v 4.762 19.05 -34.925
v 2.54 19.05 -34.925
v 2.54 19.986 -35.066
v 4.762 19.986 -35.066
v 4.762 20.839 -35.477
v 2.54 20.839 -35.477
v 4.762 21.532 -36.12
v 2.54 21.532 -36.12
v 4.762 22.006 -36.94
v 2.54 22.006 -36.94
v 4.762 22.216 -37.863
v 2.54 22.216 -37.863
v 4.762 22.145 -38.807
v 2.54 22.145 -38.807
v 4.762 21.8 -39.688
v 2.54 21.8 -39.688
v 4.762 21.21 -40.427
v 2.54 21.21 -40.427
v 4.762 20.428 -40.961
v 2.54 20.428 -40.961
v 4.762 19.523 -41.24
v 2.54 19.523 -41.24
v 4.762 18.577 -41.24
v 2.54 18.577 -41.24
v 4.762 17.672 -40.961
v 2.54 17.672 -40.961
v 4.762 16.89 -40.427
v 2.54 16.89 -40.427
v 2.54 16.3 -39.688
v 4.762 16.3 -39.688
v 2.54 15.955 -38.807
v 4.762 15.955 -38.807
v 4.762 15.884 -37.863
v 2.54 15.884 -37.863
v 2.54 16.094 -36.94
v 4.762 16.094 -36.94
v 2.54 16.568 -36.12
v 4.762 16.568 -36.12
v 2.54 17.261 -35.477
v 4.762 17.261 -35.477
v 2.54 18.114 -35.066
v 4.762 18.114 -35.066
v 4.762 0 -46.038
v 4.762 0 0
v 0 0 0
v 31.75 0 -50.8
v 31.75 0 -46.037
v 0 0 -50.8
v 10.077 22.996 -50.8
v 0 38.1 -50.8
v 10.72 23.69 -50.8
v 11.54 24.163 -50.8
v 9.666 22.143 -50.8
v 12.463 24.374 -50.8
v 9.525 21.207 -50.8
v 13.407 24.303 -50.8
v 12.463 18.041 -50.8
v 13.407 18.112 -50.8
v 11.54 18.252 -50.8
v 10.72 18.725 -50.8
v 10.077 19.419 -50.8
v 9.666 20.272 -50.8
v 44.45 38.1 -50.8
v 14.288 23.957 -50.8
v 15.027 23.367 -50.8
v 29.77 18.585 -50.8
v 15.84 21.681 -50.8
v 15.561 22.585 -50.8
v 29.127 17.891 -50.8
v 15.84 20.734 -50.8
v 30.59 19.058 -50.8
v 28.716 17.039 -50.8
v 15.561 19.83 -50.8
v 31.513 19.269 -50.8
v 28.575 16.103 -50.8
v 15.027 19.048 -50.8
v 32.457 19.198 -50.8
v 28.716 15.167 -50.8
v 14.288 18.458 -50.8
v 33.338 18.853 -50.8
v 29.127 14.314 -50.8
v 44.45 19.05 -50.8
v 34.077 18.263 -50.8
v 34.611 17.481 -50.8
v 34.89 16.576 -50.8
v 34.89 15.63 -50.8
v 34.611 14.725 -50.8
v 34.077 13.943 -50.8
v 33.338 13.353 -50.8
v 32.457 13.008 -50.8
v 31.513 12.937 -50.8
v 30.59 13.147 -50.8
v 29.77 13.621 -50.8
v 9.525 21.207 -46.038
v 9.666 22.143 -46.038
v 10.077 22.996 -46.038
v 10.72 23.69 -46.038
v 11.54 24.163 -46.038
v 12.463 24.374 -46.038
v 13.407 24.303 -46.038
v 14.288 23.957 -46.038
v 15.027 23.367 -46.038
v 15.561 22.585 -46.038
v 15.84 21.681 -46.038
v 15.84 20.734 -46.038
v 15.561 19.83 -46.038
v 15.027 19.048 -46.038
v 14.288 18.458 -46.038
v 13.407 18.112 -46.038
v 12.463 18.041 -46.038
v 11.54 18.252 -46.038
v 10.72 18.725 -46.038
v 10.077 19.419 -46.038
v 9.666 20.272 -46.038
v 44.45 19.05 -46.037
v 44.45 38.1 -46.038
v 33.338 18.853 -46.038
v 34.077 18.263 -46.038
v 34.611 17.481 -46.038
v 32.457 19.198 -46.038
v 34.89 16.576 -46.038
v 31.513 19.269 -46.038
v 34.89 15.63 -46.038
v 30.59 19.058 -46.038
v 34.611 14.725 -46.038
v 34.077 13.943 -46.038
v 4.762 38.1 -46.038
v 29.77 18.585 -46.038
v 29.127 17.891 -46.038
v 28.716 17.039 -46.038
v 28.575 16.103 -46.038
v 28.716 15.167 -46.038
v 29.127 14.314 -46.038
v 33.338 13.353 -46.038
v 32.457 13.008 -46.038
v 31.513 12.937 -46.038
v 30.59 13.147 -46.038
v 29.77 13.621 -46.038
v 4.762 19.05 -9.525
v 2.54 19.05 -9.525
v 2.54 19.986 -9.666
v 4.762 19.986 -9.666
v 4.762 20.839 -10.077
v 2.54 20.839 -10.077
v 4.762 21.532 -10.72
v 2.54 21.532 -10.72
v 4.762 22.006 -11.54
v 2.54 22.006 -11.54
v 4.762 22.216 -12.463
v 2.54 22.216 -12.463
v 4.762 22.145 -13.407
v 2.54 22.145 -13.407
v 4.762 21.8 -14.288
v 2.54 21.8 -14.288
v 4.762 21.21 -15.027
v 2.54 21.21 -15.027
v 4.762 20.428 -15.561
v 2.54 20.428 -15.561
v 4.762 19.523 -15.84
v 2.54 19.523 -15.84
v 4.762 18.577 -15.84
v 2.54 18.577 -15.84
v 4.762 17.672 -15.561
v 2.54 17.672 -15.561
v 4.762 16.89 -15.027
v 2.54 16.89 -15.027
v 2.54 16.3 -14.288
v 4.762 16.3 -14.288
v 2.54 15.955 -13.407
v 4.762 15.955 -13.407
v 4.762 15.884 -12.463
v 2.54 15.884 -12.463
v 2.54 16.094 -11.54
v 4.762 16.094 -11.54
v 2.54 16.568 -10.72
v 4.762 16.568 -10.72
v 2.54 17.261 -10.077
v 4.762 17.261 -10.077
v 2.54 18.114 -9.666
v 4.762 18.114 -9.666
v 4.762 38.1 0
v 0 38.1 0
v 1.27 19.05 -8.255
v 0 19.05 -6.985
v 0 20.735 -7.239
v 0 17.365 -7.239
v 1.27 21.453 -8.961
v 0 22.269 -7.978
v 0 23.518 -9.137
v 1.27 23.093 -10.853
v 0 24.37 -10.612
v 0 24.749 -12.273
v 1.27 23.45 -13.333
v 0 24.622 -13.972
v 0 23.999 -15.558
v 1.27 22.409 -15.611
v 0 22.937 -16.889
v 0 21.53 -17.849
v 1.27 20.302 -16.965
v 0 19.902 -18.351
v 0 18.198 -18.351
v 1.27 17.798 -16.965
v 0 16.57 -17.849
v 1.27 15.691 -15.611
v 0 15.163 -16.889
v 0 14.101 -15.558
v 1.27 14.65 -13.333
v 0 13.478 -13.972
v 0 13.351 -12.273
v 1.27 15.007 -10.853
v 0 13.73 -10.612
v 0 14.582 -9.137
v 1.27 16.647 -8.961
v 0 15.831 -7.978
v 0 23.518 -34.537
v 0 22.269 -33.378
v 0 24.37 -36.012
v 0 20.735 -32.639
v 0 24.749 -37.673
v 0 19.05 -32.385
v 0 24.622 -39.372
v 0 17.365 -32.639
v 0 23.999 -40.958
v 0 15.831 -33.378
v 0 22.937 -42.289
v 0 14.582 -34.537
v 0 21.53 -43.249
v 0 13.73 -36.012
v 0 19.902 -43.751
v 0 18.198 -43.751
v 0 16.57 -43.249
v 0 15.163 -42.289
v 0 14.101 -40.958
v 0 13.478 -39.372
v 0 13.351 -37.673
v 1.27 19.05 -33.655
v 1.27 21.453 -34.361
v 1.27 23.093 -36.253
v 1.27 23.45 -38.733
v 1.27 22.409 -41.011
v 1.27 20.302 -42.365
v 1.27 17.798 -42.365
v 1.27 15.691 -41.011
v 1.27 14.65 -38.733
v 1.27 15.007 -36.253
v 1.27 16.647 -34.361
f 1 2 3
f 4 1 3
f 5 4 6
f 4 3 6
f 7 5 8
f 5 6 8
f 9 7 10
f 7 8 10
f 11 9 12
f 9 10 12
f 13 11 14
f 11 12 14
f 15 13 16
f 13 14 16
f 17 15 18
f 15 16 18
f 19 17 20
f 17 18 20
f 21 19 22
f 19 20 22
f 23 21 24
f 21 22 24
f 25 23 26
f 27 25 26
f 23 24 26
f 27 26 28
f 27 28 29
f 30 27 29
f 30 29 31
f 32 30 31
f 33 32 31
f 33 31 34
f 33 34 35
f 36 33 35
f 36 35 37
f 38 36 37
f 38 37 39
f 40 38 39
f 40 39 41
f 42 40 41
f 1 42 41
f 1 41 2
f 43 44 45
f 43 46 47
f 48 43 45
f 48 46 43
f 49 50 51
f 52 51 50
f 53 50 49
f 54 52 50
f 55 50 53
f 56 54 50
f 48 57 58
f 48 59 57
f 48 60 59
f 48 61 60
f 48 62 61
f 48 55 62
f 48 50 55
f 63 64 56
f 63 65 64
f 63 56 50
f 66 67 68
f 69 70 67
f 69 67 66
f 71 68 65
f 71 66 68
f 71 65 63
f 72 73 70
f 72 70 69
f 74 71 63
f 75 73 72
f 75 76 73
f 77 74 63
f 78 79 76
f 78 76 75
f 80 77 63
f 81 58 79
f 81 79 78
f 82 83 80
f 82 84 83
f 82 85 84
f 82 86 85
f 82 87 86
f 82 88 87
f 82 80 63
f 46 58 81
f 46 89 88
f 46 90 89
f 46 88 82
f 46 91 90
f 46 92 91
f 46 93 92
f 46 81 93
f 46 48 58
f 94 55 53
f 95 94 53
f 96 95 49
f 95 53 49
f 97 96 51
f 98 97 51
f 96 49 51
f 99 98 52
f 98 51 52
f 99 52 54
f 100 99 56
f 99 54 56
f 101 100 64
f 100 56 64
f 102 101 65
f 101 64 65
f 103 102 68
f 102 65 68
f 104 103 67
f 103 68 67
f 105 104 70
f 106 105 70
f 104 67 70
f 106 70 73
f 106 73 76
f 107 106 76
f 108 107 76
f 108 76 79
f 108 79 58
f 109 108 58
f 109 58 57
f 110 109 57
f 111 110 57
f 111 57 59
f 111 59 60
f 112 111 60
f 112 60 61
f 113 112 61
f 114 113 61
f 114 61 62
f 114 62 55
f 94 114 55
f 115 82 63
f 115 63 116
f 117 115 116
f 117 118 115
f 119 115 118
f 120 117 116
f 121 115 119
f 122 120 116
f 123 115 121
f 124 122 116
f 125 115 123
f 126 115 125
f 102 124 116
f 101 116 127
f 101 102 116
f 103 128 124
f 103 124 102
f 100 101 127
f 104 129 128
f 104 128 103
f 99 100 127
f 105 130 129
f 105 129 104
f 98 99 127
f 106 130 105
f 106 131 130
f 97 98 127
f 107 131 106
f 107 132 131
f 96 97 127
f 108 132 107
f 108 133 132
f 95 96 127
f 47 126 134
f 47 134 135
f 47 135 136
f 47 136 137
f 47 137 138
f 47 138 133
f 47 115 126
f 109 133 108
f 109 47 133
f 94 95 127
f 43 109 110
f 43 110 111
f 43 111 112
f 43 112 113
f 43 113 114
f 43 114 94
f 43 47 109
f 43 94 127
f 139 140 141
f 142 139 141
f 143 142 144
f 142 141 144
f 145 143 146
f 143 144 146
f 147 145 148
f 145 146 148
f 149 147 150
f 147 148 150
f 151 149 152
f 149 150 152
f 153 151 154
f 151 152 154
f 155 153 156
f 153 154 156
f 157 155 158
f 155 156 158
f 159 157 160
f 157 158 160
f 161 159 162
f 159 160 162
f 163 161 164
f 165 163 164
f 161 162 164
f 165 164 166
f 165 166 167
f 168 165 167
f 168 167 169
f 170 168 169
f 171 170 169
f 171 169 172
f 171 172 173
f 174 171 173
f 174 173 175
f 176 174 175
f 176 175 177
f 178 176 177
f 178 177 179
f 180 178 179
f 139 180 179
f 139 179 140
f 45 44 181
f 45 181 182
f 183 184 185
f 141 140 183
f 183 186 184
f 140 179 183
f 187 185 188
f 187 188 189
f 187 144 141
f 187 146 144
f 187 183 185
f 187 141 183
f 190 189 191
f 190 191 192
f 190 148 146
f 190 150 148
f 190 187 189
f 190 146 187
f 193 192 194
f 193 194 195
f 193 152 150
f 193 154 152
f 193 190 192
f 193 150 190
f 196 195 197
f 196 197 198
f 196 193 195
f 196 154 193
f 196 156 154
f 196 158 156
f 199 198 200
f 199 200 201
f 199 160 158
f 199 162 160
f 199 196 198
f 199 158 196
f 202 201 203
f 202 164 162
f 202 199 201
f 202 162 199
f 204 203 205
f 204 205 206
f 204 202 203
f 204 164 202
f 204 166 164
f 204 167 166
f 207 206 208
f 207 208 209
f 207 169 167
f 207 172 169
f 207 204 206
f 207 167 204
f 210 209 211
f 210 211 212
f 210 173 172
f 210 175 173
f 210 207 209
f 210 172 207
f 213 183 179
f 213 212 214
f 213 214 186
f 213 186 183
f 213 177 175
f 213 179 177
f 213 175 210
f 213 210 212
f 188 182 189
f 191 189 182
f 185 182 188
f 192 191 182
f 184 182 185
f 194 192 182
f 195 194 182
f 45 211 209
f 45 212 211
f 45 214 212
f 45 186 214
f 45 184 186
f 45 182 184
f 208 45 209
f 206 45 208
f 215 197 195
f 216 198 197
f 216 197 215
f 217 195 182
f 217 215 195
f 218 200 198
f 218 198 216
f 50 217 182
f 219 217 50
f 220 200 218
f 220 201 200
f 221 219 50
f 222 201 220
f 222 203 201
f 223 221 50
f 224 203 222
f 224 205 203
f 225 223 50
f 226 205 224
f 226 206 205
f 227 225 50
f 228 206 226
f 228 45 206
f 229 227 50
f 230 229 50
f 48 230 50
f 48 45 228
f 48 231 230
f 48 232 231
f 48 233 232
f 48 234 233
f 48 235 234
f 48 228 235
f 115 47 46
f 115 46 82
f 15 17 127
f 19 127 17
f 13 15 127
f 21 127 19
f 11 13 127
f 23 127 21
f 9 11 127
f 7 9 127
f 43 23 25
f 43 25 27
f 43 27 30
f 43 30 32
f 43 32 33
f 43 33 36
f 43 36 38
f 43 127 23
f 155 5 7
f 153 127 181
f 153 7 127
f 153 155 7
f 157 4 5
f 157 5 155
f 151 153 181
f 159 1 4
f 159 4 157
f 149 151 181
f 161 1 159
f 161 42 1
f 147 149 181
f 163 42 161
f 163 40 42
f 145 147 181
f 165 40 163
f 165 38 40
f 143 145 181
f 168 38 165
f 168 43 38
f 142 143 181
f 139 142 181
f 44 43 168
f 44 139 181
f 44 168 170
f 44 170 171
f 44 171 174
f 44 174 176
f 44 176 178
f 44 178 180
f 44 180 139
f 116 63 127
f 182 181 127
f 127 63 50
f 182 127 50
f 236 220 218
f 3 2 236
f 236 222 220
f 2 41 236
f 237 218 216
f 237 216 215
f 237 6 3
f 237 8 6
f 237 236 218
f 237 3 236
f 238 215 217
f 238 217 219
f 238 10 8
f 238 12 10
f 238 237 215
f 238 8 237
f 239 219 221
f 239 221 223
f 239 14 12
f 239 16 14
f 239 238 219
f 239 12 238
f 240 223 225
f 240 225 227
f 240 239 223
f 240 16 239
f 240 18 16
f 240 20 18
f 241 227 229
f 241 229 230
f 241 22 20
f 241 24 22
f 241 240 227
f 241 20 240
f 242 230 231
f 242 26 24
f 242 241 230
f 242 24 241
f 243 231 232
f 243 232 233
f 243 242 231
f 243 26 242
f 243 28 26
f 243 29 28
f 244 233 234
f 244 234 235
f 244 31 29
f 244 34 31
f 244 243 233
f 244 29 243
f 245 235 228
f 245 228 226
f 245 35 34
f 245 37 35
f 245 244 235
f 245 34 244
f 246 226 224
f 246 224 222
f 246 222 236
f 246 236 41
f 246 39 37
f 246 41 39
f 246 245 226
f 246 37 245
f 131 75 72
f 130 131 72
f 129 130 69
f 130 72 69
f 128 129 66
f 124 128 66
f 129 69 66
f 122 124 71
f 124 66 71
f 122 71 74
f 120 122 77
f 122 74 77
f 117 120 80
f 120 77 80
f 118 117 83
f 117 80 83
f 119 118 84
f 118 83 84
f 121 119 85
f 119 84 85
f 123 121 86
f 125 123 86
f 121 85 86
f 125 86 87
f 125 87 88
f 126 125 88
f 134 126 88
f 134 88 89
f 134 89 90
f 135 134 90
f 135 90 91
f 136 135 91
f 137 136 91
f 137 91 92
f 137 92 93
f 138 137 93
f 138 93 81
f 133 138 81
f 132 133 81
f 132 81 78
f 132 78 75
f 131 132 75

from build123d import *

# Parameters (mm, degrees)
BOSS_EXTRUDE1_DEPTH     = 38.1
CUT_EXTRUDE1_REACH      = 79.512
SKETCH2_R               = 3.175
CUT_EXTRUDE2_REACH      = 79.512
SKETCH4_R               = 3.175
CHAMFER1_SIZE           = 2.54
CUT_EXTRUDE3_DEPTH      = 78.51162816
CUT_EXTRUDE3_DEPTH_BACK = 78.51162816


with BuildPart() as part:
    # Sketch1 → Boss-Extrude1 (new body)
    with BuildSketch(Plane(origin=(0, 0, 0), x_dir=(1, 0, 0), z_dir=(0, 1, 0))):
        Polygon((0, 0), (0, 50.8), (44.45, 50.8), (44.45, 46.0375), (4.7625, 46.0375), (4.7625, 0), align=None)
    extrude(amount=BOSS_EXTRUDE1_DEPTH)

    # Sketch2 → Cut-Extrude1 (cut, up to next)
    with BuildSketch(Plane(origin=(0, 0, -50.8), x_dir=(-1, 0, 0), z_dir=(0, 0, -1)), mode=Mode.PRIVATE) as cut_extrude1_sk1:
        with Locations((-12.7, 21.20738686)):
            Circle(SKETCH2_R)
    cut_extrude1_tool1 = extrude(cut_extrude1_sk1.sketch, amount=-CUT_EXTRUDE1_REACH, mode=Mode.PRIVATE) & part.part
    # Sketch2 → Cut-Extrude1 (cut, up to next)
    with BuildSketch(Plane(origin=(0, 0, -50.8), x_dir=(-1, 0, 0), z_dir=(0, 0, -1)), mode=Mode.PRIVATE) as cut_extrude1_sk2:
        with Locations((-31.75, 16.102954744)):
            Circle(SKETCH2_R)
    cut_extrude1_tool2 = extrude(cut_extrude1_sk2.sketch, amount=-CUT_EXTRUDE1_REACH, mode=Mode.PRIVATE) & part.part
    add(cut_extrude1_tool1.solids().sort_by_distance((12.7, 21.207387, -50.8))[0], mode=Mode.SUBTRACT)
    add(cut_extrude1_tool2.solids().sort_by_distance((31.75, 16.102955, -50.8))[0], mode=Mode.SUBTRACT)

    # Sketch4 → Cut-Extrude2 (cut, up to next)
    with BuildSketch(Plane.ZY, mode=Mode.PRIVATE) as cut_extrude2_sk1:
        with Locations((-12.7, 19.05)):
            Circle(SKETCH4_R)
    cut_extrude2_tool1 = extrude(cut_extrude2_sk1.sketch, amount=-CUT_EXTRUDE2_REACH, mode=Mode.PRIVATE) & part.part
    # Sketch4 → Cut-Extrude2 (cut, up to next)
    with BuildSketch(Plane.ZY, mode=Mode.PRIVATE) as cut_extrude2_sk2:
        with Locations((-38.1, 19.05)):
            Circle(SKETCH4_R)
    cut_extrude2_tool2 = extrude(cut_extrude2_sk2.sketch, amount=-CUT_EXTRUDE2_REACH, mode=Mode.PRIVATE) & part.part
    add(cut_extrude2_tool1.solids().sort_by_distance((0, 19.05, -12.7))[0], mode=Mode.SUBTRACT)
    add(cut_extrude2_tool2.solids().sort_by_distance((0, 19.05, -38.1))[0], mode=Mode.SUBTRACT)

    # Chamfer1
    chamfer1_edges = [part.edges().sort_by_distance(p)[0] for p in [
        (0, 19.05, -15.875),
        (0, 19.05, -41.275),
    ]]
    chamfer(chamfer1_edges, length=CHAMFER1_SIZE)

    # Sketch5 → Cut-Extrude3 (cut, two sides: drawn at the far end of the back side and taken through both)
    with BuildSketch(Plane(origin=(0, 0, -50.8), x_dir=(-1, 0, 0), z_dir=(0, 0, -1)).offset(-CUT_EXTRUDE3_DEPTH_BACK)):
        Polygon((28.817809215, -90.851713823), (-31.75, 0), (-44.45, 19.05), (-105.017809215, 109.901713823), (-286.721236861, -11.233904608), (-152.88561843, -211.987332253), align=None)
    extrude(amount=CUT_EXTRUDE3_DEPTH + CUT_EXTRUDE3_DEPTH_BACK, mode=Mode.SUBTRACT)


solid = part.part
